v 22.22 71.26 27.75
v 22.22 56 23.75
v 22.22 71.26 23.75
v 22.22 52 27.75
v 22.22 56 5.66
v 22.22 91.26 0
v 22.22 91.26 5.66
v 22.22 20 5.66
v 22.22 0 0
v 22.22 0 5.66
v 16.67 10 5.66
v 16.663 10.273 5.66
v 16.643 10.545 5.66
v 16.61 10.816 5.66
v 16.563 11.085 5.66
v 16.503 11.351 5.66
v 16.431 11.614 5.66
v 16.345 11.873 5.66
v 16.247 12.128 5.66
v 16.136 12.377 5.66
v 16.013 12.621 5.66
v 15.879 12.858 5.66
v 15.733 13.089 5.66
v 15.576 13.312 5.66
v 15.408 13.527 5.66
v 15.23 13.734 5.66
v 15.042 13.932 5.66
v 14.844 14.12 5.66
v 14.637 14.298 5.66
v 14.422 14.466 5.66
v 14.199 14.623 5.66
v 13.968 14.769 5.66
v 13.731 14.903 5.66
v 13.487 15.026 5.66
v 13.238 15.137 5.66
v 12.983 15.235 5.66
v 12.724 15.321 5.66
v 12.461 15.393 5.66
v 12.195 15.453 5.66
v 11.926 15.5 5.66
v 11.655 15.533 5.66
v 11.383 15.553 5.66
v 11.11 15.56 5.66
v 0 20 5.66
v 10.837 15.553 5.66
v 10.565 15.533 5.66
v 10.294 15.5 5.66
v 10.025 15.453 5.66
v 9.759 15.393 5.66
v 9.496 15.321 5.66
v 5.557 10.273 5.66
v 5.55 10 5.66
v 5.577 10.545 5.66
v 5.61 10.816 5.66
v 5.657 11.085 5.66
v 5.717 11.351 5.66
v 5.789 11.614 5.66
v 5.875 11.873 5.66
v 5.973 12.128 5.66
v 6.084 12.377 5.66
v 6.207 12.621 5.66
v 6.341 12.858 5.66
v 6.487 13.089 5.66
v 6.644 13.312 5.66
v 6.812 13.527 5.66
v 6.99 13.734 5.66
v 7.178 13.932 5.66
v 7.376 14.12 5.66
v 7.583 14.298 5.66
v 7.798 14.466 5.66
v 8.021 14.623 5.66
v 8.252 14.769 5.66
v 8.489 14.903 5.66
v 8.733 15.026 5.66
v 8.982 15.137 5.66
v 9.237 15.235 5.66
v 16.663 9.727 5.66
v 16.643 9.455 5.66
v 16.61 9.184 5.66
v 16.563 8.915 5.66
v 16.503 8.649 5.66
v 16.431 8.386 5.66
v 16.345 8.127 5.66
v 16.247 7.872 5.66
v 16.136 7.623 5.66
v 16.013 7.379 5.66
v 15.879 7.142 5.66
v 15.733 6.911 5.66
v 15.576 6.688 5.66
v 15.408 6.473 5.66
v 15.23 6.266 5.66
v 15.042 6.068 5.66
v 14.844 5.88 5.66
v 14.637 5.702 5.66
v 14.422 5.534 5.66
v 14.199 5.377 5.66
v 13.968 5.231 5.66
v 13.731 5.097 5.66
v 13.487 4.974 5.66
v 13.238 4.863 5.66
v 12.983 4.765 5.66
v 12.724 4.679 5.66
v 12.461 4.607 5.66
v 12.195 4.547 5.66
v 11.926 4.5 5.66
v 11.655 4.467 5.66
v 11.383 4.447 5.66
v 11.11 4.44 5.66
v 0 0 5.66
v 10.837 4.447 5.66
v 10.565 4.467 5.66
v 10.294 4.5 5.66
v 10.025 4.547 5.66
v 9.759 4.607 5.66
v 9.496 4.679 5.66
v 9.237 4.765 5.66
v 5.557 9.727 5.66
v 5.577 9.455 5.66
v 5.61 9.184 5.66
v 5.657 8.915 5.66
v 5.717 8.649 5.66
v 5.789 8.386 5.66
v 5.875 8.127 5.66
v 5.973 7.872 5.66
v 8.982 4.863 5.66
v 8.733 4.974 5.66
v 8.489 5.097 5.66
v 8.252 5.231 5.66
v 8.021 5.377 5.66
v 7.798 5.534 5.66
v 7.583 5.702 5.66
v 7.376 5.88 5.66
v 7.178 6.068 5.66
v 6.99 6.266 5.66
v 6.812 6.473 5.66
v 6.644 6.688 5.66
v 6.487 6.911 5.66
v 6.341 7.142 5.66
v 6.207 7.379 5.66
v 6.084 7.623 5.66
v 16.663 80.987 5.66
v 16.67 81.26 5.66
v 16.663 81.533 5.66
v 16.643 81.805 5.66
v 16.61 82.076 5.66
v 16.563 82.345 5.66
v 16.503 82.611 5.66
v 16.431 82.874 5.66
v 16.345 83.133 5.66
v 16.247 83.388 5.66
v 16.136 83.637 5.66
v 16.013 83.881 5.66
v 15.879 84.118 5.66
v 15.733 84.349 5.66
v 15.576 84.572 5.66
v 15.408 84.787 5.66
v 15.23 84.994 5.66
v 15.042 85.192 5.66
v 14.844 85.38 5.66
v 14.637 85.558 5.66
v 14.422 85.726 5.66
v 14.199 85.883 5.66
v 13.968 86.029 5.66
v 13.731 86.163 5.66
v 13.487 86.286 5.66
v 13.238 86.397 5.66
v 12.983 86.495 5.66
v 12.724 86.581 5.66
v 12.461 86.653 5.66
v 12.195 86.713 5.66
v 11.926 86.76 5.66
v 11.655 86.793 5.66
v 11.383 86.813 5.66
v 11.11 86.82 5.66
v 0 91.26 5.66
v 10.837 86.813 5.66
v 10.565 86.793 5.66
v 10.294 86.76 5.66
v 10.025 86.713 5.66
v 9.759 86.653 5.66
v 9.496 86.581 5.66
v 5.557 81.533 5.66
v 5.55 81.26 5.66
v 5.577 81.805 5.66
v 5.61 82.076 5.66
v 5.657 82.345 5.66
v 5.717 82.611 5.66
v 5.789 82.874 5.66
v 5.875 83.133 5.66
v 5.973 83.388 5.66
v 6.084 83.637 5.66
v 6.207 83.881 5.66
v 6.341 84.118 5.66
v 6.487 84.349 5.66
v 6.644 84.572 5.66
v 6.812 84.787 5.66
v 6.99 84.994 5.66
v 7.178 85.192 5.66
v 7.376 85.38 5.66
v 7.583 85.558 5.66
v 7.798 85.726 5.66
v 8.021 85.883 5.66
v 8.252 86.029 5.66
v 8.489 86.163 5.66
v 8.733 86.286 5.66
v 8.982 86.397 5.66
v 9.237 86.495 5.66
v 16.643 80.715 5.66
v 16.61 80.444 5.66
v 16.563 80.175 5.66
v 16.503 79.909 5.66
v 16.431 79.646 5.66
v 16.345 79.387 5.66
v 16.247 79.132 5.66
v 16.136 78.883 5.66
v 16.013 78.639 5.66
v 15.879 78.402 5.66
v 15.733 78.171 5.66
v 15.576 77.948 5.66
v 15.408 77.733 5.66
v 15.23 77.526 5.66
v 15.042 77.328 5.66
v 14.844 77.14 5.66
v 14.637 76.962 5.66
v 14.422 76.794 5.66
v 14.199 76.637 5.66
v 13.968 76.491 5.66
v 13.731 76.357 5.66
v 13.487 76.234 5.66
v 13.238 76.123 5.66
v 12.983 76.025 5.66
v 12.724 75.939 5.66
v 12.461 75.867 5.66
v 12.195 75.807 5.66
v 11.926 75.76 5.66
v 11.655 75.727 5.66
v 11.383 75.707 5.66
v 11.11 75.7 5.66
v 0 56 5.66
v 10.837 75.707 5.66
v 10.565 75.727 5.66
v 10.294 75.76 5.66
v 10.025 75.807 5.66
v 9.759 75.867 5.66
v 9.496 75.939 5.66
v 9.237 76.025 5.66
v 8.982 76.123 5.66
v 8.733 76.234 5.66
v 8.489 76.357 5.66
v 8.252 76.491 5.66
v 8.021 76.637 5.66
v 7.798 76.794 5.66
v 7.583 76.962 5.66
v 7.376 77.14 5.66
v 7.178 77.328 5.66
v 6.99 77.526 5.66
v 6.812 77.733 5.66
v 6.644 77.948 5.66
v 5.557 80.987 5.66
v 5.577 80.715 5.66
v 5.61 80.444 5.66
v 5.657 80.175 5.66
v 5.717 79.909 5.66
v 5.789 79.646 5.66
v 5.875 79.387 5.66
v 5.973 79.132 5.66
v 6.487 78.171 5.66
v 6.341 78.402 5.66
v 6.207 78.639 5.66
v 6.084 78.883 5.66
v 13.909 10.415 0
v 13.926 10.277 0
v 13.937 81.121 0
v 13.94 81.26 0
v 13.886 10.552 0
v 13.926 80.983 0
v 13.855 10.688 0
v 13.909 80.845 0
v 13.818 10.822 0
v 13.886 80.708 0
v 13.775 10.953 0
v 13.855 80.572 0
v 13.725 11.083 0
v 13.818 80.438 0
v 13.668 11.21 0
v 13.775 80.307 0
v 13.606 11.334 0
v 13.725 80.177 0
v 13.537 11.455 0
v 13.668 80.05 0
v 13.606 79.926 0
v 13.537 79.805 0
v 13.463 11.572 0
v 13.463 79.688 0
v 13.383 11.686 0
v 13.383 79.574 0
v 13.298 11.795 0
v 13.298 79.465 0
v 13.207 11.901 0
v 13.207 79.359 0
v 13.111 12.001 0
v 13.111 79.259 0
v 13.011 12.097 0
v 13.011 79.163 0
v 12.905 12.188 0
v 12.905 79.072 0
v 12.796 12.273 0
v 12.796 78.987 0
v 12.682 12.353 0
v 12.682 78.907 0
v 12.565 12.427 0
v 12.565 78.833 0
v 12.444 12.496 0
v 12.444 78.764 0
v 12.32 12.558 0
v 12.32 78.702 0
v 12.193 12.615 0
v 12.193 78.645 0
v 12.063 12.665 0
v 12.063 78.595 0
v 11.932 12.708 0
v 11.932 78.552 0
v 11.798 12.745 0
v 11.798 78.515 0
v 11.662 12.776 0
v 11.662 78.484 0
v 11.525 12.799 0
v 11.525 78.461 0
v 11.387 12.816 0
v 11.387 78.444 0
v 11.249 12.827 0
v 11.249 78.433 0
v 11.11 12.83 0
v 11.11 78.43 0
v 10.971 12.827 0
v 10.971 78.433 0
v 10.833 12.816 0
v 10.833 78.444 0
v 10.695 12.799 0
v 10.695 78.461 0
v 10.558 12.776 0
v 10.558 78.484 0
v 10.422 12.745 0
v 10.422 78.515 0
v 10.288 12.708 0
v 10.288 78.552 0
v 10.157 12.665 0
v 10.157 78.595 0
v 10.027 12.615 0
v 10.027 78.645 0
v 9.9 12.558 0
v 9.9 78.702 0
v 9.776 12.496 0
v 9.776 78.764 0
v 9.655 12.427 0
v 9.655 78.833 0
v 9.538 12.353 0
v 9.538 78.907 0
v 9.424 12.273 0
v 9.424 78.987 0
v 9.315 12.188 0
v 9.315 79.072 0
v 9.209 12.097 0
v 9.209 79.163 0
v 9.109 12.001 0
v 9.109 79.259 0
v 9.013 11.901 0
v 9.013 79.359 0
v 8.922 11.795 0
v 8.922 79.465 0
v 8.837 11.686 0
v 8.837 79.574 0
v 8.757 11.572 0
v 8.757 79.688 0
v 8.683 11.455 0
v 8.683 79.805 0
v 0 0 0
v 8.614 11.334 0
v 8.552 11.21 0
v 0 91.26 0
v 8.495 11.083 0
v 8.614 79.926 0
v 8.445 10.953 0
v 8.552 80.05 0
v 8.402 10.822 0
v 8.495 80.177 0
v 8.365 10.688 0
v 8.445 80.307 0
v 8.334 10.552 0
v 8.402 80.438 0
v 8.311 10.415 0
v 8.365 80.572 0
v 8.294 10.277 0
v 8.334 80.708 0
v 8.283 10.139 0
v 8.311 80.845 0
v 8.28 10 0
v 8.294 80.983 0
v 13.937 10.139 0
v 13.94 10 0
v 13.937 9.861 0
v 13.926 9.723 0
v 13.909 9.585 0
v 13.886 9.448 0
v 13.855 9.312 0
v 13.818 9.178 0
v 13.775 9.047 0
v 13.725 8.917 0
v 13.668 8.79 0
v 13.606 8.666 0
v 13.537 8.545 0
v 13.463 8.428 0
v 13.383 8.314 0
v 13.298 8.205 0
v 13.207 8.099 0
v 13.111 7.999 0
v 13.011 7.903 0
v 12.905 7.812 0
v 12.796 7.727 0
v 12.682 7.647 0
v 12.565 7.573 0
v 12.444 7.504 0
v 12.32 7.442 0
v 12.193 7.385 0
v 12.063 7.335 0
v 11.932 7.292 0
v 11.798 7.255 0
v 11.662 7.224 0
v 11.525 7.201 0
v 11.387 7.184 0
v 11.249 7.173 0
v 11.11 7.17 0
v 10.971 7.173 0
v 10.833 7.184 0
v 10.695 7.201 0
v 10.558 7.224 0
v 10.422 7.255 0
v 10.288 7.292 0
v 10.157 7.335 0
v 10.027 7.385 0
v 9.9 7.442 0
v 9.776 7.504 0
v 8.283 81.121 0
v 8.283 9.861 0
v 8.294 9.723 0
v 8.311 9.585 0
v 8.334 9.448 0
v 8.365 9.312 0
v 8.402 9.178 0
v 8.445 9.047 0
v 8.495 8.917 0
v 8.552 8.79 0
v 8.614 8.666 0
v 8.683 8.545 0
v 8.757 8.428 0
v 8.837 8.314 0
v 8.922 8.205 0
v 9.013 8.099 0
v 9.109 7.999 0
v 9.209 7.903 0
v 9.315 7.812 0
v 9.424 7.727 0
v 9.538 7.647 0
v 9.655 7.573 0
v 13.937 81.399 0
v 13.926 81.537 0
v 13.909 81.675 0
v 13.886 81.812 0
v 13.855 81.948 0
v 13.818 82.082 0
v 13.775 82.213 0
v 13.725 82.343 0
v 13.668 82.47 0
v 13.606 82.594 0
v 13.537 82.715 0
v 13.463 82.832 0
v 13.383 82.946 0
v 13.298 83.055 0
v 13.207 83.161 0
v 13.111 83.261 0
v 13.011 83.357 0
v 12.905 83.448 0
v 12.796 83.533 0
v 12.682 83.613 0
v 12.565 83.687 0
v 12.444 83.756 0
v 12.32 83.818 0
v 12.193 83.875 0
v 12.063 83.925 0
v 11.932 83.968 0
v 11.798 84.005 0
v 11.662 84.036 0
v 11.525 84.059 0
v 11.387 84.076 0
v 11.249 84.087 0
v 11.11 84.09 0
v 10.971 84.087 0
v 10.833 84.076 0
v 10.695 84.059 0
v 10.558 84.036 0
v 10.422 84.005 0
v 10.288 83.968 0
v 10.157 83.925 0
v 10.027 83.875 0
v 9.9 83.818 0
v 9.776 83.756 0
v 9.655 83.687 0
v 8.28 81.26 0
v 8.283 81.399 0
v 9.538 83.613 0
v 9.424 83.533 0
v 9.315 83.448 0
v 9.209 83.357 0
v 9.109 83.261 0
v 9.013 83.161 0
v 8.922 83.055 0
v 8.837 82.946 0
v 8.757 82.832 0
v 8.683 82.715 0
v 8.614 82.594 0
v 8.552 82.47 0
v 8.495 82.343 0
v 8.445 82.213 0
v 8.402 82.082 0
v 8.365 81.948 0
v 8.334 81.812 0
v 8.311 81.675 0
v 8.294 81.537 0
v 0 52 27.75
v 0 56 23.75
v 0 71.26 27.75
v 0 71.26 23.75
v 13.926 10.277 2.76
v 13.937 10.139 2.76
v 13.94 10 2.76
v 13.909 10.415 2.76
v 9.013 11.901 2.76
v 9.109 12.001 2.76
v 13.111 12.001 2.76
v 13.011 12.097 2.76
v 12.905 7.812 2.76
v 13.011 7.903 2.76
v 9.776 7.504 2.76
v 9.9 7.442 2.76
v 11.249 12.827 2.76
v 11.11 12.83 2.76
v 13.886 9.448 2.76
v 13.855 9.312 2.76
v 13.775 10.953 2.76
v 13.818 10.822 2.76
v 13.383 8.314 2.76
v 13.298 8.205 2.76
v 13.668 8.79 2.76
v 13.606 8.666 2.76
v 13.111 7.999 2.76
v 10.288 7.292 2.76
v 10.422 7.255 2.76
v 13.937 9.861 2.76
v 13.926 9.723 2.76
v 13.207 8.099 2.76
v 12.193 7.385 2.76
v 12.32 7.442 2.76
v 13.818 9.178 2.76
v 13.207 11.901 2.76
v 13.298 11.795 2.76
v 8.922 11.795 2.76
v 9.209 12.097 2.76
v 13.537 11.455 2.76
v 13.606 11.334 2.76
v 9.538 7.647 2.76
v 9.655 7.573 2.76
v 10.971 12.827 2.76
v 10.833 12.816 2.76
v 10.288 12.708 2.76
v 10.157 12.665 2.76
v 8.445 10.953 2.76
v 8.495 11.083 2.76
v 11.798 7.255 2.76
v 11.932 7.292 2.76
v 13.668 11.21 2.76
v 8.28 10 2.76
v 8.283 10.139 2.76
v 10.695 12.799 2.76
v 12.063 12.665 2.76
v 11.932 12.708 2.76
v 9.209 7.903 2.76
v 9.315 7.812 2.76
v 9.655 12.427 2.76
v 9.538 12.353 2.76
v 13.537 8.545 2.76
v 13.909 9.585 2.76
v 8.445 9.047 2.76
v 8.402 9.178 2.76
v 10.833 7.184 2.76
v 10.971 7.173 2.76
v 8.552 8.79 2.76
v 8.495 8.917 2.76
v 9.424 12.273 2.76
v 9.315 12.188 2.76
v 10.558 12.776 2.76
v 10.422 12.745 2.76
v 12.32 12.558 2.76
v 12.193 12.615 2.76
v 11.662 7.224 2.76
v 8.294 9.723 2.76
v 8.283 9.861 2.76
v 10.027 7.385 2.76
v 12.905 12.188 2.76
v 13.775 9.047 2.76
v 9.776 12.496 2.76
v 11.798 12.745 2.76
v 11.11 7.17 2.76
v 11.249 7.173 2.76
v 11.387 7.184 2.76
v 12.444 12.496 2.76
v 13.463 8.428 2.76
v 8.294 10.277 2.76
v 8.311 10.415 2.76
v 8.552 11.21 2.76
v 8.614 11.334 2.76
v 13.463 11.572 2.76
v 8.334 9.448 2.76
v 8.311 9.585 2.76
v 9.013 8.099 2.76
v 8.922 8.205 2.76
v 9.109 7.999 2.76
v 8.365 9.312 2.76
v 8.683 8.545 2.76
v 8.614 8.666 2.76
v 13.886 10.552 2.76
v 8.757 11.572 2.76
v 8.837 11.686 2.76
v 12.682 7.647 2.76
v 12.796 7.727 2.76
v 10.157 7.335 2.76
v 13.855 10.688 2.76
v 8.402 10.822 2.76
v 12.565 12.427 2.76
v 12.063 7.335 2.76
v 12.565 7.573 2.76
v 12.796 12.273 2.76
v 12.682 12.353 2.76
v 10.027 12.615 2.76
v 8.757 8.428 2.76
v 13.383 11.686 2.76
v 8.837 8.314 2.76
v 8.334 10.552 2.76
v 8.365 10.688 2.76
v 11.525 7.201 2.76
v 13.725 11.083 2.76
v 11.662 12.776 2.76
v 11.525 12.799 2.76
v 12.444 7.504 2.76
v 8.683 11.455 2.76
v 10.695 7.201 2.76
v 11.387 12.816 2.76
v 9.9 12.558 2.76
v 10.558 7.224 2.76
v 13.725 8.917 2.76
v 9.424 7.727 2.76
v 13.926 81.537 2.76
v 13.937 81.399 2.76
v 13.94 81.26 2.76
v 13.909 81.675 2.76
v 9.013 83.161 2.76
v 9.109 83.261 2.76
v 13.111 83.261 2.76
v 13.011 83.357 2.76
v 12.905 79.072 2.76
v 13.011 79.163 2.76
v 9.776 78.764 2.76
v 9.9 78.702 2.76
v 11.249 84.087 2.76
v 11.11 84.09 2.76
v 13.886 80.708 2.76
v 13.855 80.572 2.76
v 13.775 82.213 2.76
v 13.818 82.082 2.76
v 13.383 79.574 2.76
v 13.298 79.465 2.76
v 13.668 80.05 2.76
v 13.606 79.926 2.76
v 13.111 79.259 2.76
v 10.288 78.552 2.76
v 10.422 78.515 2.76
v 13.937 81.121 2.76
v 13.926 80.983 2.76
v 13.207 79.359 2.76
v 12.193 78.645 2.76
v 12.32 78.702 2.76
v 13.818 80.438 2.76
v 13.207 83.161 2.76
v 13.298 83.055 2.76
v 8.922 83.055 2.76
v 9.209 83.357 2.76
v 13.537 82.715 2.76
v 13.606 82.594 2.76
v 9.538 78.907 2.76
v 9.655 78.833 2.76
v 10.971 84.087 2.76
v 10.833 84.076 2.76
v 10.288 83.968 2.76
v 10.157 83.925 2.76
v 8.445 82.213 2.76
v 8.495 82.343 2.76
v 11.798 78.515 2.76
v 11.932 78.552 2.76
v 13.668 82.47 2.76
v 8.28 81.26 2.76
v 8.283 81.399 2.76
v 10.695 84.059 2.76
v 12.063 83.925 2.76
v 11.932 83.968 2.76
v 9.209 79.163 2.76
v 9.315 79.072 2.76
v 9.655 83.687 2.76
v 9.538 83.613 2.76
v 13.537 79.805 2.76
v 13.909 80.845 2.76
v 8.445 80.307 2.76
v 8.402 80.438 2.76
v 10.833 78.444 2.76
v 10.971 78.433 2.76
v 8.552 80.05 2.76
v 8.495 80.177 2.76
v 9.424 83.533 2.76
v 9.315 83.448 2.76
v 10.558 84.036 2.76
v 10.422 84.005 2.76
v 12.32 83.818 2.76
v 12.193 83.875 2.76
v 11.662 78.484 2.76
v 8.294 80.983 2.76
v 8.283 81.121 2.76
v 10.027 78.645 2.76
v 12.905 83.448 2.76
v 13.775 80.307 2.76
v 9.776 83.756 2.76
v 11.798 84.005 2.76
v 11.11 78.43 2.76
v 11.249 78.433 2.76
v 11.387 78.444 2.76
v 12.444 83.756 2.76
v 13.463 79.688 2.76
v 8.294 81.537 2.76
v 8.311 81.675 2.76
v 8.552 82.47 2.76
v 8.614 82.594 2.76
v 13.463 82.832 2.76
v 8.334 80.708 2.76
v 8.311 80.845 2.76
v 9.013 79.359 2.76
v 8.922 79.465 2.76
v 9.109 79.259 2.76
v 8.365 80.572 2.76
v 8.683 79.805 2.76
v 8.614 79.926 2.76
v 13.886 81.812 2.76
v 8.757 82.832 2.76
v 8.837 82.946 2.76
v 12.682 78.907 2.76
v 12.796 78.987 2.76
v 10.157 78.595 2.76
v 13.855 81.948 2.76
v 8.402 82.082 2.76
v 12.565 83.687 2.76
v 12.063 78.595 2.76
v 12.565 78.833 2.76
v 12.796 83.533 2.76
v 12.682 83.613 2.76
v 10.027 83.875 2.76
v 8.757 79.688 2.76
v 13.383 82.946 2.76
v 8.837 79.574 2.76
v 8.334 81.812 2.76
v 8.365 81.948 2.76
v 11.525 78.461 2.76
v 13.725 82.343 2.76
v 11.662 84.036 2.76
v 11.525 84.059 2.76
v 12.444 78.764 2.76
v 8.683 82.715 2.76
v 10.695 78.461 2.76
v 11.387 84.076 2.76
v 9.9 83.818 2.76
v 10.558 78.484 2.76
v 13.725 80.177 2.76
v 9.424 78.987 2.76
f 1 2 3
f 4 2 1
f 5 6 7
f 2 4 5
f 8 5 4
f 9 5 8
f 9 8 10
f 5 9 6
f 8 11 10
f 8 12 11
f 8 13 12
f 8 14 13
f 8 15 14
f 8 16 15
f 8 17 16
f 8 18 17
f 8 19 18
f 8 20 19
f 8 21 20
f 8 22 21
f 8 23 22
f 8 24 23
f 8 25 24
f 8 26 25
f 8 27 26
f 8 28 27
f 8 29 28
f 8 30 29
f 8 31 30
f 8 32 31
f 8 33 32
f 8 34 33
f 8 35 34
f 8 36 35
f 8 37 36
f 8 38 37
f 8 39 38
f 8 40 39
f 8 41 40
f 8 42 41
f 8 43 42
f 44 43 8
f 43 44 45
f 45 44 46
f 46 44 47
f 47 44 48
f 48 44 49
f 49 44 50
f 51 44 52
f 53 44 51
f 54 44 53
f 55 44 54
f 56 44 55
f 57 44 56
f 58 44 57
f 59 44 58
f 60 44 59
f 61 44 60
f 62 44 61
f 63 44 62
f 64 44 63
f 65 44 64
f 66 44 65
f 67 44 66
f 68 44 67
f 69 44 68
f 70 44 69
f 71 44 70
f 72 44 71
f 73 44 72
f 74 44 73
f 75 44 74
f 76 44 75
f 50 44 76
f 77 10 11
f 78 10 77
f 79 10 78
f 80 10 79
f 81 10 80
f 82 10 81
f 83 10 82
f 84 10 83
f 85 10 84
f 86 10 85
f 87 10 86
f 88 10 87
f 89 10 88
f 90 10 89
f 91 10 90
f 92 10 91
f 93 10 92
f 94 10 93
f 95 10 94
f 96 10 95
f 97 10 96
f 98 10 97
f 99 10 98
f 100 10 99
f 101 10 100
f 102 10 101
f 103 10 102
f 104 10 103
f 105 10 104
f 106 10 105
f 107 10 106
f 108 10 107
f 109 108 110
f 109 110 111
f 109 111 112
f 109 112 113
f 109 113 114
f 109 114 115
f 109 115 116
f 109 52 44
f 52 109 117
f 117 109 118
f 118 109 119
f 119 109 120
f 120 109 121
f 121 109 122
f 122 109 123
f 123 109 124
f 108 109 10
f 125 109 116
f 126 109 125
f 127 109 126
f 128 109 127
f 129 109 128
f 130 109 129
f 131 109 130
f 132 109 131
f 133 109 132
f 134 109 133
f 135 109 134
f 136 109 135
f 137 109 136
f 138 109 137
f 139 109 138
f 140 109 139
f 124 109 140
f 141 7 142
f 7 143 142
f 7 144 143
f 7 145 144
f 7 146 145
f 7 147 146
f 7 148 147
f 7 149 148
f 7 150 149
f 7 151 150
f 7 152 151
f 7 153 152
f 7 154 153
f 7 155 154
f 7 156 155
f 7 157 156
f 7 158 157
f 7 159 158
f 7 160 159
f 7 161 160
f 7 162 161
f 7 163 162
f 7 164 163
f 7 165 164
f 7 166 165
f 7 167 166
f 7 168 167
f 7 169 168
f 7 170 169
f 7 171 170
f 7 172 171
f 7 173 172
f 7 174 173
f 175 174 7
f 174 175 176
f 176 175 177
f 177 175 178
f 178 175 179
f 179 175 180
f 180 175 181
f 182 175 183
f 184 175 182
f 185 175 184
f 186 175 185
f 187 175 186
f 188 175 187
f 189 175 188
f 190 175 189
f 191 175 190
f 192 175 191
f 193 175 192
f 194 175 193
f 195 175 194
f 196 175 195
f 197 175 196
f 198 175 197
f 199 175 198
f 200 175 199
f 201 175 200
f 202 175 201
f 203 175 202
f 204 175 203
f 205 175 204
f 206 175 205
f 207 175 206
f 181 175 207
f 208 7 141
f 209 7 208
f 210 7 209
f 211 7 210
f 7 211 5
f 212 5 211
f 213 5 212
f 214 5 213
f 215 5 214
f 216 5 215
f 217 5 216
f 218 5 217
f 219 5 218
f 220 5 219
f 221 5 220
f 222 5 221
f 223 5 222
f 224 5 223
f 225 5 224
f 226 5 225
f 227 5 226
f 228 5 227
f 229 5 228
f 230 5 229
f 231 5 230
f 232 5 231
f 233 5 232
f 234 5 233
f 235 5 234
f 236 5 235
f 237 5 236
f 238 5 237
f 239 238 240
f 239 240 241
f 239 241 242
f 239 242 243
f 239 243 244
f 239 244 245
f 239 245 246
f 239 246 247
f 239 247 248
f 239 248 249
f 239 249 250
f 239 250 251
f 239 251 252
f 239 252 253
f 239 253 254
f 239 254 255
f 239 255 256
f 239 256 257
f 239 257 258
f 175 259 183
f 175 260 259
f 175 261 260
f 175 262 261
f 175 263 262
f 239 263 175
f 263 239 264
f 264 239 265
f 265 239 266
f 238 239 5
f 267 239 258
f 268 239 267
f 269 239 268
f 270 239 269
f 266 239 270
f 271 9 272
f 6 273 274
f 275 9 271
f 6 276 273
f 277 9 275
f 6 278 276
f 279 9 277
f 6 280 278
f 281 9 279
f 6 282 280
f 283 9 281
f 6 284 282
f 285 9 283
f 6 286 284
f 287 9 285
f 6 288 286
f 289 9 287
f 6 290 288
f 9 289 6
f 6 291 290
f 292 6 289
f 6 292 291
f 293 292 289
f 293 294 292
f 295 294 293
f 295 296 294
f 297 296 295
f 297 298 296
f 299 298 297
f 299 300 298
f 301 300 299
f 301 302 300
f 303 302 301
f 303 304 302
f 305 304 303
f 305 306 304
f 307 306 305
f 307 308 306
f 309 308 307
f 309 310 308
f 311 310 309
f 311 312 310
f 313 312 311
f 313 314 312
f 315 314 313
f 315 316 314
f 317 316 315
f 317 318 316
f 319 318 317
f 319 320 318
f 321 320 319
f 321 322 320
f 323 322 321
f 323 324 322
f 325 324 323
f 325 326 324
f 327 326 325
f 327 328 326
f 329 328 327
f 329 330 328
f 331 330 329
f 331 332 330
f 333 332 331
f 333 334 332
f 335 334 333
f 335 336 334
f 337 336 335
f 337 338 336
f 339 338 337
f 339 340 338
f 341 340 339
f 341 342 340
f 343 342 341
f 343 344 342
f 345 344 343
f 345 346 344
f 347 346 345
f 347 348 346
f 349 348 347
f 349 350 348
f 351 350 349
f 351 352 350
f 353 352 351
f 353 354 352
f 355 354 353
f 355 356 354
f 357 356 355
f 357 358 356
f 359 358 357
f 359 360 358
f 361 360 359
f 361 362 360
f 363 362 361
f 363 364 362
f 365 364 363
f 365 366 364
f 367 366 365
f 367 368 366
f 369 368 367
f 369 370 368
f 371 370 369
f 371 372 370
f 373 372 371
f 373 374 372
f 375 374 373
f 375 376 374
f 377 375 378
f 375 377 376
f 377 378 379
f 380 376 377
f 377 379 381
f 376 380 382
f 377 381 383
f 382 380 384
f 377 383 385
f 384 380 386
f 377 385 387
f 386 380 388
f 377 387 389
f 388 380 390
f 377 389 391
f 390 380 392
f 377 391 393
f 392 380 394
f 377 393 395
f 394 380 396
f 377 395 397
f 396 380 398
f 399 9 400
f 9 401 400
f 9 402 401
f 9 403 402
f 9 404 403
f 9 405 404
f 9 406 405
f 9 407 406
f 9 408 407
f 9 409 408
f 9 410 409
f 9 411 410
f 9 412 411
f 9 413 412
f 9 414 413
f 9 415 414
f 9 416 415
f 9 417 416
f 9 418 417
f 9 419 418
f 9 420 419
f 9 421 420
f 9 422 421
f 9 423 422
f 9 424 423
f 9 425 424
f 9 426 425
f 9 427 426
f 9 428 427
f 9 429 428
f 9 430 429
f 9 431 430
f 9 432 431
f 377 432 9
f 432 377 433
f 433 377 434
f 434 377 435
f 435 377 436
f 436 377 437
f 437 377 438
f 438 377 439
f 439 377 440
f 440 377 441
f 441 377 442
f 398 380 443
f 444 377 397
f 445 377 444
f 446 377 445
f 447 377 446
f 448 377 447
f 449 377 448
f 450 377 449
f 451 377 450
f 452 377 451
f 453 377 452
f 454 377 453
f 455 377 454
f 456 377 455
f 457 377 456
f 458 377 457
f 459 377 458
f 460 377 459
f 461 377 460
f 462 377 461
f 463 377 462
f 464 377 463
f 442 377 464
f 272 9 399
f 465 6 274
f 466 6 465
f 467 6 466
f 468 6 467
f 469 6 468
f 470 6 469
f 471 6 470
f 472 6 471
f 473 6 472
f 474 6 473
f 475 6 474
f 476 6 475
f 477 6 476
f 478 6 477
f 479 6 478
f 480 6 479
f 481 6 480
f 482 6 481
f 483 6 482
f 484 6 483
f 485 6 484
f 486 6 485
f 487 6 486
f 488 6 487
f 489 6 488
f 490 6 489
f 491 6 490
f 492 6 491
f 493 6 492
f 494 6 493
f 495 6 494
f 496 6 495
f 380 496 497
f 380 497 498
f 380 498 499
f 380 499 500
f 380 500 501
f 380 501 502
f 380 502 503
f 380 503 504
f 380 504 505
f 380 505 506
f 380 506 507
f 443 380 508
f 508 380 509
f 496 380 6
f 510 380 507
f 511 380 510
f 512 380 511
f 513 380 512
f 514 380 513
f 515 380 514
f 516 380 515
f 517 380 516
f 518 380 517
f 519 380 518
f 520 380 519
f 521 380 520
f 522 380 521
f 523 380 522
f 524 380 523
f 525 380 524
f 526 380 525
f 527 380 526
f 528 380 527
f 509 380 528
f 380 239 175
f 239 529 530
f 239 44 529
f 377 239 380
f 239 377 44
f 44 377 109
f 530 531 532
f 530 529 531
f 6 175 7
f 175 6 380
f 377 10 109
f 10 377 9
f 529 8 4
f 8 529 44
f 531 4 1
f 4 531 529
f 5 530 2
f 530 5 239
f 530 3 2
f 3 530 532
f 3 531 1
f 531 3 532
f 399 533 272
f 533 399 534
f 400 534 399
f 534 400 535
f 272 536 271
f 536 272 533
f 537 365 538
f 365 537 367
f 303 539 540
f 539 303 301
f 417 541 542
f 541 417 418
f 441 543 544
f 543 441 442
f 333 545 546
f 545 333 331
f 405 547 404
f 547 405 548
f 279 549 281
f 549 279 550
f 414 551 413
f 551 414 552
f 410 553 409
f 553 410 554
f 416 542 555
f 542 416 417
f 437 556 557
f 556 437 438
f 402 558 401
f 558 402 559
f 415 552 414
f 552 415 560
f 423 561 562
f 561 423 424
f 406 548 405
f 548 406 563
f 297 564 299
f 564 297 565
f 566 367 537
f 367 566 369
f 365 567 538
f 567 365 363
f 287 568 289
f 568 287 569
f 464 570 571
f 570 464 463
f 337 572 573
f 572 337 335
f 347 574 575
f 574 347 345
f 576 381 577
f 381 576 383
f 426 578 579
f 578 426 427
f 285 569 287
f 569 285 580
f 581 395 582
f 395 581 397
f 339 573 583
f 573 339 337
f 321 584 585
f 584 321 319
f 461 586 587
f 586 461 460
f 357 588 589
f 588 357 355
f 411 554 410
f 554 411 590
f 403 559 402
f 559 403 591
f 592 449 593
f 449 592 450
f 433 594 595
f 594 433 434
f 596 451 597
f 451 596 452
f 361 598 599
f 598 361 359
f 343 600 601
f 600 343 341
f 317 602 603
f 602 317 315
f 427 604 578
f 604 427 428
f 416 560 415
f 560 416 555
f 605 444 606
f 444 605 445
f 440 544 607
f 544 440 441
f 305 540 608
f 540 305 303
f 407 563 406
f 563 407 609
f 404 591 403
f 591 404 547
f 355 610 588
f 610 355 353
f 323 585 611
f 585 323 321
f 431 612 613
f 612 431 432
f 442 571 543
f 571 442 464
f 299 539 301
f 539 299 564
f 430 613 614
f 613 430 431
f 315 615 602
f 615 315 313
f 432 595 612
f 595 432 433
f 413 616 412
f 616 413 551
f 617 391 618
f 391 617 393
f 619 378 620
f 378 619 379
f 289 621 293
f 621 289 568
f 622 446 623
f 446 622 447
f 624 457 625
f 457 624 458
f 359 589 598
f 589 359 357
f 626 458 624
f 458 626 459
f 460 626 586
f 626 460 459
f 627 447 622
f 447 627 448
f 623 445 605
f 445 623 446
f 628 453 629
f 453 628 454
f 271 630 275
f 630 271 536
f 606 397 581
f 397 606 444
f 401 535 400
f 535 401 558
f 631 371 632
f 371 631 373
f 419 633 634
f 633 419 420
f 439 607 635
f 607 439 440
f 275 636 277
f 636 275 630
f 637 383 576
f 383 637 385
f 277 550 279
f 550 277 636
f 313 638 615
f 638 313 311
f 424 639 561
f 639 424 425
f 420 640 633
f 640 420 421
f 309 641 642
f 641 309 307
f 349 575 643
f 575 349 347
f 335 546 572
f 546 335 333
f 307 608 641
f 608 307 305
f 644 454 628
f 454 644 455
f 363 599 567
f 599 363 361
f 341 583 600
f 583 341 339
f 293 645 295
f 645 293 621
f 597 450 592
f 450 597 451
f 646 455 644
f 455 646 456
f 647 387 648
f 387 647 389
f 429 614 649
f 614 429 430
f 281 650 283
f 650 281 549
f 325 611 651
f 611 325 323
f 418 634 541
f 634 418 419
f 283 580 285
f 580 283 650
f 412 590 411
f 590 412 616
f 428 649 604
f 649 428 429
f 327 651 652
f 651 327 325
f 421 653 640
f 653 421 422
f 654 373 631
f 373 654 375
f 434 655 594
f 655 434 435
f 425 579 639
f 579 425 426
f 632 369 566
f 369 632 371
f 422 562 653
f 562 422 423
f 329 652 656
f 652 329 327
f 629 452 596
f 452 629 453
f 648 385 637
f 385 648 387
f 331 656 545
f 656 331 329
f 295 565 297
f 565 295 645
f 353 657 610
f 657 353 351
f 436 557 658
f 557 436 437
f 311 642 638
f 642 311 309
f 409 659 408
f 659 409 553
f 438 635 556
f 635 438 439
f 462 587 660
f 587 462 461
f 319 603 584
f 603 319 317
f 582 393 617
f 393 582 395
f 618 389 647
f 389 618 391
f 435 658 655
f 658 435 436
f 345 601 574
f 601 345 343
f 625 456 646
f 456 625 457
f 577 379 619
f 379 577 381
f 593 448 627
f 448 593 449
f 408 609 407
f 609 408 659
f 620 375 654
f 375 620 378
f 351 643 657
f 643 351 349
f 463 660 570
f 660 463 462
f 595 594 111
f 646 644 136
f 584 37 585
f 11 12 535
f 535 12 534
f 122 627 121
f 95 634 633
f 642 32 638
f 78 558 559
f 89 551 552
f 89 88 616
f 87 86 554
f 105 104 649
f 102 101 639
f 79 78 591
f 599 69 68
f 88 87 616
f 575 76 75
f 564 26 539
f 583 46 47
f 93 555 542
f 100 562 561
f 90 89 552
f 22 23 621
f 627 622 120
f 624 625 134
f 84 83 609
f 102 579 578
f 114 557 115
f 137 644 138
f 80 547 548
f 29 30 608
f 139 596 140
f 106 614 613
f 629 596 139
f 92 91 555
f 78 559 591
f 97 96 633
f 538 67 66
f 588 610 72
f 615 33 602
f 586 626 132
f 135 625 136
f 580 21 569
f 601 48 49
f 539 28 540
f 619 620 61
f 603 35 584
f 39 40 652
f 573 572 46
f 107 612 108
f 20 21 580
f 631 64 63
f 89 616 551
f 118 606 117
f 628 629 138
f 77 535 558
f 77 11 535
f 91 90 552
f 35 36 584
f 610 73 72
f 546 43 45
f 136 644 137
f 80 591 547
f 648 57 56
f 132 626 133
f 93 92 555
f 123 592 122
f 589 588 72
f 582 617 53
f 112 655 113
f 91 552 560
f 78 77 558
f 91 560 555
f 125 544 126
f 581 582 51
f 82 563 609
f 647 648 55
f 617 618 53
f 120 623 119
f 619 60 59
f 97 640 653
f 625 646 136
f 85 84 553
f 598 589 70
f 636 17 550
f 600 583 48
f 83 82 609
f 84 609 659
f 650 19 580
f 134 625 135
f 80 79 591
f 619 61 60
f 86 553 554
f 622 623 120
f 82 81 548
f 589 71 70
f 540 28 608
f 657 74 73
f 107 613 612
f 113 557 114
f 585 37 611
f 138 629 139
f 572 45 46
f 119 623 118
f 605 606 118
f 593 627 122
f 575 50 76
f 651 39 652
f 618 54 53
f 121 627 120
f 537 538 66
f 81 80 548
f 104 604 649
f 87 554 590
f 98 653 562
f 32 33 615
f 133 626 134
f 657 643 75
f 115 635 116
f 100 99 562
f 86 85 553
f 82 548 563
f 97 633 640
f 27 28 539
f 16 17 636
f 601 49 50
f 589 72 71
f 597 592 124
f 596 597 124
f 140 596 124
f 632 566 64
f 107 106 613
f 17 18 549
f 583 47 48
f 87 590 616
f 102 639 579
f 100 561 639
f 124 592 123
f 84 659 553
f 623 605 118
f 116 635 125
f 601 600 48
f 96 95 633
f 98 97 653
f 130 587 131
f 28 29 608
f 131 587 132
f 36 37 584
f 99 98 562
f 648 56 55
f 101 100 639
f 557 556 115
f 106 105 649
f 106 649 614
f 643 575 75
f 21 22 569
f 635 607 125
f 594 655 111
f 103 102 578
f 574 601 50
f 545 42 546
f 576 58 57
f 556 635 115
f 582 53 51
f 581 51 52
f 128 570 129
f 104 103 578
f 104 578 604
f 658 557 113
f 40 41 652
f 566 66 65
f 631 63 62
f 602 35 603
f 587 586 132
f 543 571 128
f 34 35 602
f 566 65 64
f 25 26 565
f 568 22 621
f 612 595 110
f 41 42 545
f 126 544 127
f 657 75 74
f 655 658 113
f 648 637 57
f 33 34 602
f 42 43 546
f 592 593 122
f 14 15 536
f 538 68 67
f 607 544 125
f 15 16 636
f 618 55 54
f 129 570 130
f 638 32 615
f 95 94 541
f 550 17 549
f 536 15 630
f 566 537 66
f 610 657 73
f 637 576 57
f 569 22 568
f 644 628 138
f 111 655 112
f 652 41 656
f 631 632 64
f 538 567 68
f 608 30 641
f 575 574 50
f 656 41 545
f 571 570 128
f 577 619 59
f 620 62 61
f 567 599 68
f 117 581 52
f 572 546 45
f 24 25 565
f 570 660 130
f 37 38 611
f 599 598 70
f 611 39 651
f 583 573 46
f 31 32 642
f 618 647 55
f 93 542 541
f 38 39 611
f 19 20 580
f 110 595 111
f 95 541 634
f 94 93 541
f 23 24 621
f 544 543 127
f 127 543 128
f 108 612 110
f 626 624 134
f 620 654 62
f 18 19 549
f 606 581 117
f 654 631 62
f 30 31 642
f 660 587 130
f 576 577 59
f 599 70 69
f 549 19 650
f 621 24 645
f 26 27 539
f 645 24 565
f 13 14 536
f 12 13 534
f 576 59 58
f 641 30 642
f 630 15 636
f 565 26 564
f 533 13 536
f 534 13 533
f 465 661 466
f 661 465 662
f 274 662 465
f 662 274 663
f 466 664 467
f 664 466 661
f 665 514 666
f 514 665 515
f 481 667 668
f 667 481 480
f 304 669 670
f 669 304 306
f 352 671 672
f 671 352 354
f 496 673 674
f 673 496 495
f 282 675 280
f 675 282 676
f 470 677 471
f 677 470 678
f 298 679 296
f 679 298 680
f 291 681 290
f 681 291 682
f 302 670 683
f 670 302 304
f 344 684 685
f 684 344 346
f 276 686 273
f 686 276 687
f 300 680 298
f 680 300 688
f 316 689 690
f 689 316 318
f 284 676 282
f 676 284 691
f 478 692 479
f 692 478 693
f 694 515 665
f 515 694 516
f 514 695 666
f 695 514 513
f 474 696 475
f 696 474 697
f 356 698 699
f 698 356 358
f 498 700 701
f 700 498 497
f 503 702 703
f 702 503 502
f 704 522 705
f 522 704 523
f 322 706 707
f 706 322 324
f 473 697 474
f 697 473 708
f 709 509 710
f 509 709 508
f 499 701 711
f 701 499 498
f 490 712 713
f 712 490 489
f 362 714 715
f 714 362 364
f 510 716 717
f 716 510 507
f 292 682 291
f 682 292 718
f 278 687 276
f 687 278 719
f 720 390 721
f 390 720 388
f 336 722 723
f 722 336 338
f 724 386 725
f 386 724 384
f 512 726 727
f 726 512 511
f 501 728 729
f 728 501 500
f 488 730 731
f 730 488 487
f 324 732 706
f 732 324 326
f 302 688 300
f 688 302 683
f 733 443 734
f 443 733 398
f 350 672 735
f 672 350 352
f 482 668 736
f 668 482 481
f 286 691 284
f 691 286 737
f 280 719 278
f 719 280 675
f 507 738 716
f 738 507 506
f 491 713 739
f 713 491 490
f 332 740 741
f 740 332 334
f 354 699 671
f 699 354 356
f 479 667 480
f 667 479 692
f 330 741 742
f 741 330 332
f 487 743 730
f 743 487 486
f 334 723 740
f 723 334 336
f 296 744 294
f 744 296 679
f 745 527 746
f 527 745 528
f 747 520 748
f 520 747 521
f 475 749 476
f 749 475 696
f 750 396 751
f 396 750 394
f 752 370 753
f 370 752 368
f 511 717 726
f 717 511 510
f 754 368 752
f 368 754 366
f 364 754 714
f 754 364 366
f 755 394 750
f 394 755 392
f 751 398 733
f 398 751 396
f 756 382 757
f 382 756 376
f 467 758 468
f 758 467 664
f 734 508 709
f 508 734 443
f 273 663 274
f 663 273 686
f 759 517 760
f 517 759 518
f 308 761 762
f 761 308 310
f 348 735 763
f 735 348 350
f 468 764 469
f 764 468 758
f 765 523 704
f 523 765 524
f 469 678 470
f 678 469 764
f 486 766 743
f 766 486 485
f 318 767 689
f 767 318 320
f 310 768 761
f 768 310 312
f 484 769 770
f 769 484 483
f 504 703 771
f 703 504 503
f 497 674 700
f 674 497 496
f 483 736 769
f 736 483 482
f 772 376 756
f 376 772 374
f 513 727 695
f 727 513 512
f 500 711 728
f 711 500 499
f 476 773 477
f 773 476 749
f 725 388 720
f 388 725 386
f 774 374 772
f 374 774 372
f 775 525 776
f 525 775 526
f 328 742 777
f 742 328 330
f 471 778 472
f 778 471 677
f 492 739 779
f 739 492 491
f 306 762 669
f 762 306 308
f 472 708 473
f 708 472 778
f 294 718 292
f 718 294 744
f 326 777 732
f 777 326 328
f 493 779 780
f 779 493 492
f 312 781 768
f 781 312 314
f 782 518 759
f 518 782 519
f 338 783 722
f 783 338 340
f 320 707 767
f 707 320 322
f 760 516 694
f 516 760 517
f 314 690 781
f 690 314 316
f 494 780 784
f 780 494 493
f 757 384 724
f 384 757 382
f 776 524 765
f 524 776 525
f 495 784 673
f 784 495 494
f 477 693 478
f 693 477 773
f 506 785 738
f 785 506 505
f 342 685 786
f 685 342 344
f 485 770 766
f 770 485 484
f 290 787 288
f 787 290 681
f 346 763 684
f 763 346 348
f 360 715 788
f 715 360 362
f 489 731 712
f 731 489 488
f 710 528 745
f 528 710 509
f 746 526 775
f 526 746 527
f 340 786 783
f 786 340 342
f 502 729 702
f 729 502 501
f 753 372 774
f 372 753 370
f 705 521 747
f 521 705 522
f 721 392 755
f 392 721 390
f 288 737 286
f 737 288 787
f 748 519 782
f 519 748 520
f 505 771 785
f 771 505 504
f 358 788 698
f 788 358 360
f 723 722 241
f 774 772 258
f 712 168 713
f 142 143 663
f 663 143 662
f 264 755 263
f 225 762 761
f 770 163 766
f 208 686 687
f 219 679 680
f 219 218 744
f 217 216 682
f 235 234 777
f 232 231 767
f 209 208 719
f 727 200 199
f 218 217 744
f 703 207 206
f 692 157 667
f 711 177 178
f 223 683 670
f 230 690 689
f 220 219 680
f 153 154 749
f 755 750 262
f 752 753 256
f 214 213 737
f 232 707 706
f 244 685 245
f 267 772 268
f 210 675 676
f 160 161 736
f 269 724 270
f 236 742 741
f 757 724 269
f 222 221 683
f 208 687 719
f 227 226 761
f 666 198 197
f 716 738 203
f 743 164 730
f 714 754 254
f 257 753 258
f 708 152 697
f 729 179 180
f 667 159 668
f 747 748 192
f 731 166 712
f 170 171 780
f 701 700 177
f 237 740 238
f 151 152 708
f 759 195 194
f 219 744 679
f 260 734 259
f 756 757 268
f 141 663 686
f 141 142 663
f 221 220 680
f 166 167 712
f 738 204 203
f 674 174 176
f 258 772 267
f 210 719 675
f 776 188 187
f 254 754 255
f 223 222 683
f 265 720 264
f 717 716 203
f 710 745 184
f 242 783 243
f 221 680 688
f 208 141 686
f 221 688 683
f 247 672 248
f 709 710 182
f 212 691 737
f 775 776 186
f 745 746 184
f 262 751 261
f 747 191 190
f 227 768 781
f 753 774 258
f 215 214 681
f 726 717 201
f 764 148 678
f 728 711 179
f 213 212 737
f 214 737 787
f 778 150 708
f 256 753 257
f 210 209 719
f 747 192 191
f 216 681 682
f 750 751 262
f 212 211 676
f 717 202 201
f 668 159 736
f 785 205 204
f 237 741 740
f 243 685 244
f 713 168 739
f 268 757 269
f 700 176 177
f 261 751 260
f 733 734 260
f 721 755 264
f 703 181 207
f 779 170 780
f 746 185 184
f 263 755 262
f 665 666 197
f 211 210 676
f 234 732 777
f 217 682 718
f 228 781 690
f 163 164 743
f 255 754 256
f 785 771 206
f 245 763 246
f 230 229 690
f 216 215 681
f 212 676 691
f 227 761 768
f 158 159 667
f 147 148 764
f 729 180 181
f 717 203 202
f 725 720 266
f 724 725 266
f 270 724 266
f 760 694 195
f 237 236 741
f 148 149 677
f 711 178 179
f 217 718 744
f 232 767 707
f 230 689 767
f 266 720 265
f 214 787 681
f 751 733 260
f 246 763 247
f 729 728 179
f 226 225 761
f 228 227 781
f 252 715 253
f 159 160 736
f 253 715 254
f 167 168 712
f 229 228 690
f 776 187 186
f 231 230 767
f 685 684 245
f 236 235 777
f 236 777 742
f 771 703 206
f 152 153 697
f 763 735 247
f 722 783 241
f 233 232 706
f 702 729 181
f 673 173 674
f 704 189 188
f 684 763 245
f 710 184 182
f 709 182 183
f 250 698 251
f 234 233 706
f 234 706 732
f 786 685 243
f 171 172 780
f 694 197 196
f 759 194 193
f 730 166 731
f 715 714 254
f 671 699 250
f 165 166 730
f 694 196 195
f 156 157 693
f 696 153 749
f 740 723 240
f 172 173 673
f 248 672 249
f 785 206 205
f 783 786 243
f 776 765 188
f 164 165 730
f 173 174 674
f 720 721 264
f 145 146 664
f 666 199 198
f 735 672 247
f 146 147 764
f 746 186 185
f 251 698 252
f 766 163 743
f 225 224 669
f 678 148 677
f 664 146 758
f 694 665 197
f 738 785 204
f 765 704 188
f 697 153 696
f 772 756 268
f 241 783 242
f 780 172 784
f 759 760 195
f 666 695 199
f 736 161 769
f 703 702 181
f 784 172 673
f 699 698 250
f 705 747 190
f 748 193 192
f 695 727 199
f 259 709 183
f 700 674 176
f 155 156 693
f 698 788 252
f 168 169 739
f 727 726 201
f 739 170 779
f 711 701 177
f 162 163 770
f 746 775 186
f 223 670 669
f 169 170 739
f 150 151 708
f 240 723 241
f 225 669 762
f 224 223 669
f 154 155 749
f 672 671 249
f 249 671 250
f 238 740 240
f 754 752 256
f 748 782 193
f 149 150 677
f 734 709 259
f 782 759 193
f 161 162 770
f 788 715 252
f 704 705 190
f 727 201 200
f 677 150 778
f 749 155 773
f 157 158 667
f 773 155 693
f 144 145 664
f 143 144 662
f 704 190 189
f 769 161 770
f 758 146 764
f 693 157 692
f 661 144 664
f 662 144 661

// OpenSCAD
///////////////////////////////////
// Minimal Hoover Freedom Holder //
//      by  left2repairLIVE      //
///////////////////////////////////




$fn = 128;

backwallStrength = 5.66;
holderWidth = 22.22;

hookStrength = 4.00;
hookDepth = 15.26;
hookSpacing = 18.09;

connectorWedgeDepth = 36.00 - hookStrength;
connectorWedgeHeight = hookStrength + hookSpacing;

fullHookDepth = connectorWedgeDepth + hookStrength + hookDepth;

backwallPadding = 20;

screwDiameter = 5.66;
screwHeadDiameter = 11.12;
screwHeadHeight = 2.9;



backwallDimensions = [holderWidth, backwallPadding * 2 + fullHookDepth, backwallStrength];

connectorWedgePoints = 
[
    [0, 0],
    [0, connectorWedgeDepth],
    [connectorWedgeHeight, connectorWedgeDepth]
];

hookSupportDimensions = [holderWidth, hookStrength, hookSpacing + hookStrength];
hookSupportTranslation = [0, backwallPadding + connectorWedgeDepth, backwallStrength];

hookDimensions = [holderWidth, hookDepth, hookStrength];
hookTranslation = [0, backwallPadding + connectorWedgeDepth + hookStrength, backwallStrength + hookSpacing];

nearScrewHoleTranslation = [holderWidth / 2, backwallPadding / 2, 0];
farScrewHoleTranslation = [backwallDimensions[0] - nearScrewHoleTranslation[0], backwallDimensions[1] - nearScrewHoleTranslation[1], 0];


difference()
{
    union()
    {
        // backwall
        cube(backwallDimensions);


        // connector wedge
        translate([holderWidth,backwallPadding, backwallStrength]) rotate([0, -90, 0])
            linear_extrude(holderWidth)
                polygon(connectorWedgePoints);

        
        // hook support
        translate(hookSupportTranslation)
            cube(hookSupportDimensions);

        // hook
        translate(hookTranslation)
            cube(hookDimensions);
    }

    // near screw hole
    translate(nearScrewHoleTranslation)
        screwHole();

    // far screw hole
    translate(farScrewHoleTranslation)
        screwHole();
}




module screwHole()
{
    // screw
    cylinder(d = screwDiameter, h = backwallStrength);

    // screw head
    translate([0, 0, backwallStrength - screwHeadHeight])
        cylinder(d1 = screwDiameter, d2 = screwHeadDiameter, screwHeadHeight);
}
